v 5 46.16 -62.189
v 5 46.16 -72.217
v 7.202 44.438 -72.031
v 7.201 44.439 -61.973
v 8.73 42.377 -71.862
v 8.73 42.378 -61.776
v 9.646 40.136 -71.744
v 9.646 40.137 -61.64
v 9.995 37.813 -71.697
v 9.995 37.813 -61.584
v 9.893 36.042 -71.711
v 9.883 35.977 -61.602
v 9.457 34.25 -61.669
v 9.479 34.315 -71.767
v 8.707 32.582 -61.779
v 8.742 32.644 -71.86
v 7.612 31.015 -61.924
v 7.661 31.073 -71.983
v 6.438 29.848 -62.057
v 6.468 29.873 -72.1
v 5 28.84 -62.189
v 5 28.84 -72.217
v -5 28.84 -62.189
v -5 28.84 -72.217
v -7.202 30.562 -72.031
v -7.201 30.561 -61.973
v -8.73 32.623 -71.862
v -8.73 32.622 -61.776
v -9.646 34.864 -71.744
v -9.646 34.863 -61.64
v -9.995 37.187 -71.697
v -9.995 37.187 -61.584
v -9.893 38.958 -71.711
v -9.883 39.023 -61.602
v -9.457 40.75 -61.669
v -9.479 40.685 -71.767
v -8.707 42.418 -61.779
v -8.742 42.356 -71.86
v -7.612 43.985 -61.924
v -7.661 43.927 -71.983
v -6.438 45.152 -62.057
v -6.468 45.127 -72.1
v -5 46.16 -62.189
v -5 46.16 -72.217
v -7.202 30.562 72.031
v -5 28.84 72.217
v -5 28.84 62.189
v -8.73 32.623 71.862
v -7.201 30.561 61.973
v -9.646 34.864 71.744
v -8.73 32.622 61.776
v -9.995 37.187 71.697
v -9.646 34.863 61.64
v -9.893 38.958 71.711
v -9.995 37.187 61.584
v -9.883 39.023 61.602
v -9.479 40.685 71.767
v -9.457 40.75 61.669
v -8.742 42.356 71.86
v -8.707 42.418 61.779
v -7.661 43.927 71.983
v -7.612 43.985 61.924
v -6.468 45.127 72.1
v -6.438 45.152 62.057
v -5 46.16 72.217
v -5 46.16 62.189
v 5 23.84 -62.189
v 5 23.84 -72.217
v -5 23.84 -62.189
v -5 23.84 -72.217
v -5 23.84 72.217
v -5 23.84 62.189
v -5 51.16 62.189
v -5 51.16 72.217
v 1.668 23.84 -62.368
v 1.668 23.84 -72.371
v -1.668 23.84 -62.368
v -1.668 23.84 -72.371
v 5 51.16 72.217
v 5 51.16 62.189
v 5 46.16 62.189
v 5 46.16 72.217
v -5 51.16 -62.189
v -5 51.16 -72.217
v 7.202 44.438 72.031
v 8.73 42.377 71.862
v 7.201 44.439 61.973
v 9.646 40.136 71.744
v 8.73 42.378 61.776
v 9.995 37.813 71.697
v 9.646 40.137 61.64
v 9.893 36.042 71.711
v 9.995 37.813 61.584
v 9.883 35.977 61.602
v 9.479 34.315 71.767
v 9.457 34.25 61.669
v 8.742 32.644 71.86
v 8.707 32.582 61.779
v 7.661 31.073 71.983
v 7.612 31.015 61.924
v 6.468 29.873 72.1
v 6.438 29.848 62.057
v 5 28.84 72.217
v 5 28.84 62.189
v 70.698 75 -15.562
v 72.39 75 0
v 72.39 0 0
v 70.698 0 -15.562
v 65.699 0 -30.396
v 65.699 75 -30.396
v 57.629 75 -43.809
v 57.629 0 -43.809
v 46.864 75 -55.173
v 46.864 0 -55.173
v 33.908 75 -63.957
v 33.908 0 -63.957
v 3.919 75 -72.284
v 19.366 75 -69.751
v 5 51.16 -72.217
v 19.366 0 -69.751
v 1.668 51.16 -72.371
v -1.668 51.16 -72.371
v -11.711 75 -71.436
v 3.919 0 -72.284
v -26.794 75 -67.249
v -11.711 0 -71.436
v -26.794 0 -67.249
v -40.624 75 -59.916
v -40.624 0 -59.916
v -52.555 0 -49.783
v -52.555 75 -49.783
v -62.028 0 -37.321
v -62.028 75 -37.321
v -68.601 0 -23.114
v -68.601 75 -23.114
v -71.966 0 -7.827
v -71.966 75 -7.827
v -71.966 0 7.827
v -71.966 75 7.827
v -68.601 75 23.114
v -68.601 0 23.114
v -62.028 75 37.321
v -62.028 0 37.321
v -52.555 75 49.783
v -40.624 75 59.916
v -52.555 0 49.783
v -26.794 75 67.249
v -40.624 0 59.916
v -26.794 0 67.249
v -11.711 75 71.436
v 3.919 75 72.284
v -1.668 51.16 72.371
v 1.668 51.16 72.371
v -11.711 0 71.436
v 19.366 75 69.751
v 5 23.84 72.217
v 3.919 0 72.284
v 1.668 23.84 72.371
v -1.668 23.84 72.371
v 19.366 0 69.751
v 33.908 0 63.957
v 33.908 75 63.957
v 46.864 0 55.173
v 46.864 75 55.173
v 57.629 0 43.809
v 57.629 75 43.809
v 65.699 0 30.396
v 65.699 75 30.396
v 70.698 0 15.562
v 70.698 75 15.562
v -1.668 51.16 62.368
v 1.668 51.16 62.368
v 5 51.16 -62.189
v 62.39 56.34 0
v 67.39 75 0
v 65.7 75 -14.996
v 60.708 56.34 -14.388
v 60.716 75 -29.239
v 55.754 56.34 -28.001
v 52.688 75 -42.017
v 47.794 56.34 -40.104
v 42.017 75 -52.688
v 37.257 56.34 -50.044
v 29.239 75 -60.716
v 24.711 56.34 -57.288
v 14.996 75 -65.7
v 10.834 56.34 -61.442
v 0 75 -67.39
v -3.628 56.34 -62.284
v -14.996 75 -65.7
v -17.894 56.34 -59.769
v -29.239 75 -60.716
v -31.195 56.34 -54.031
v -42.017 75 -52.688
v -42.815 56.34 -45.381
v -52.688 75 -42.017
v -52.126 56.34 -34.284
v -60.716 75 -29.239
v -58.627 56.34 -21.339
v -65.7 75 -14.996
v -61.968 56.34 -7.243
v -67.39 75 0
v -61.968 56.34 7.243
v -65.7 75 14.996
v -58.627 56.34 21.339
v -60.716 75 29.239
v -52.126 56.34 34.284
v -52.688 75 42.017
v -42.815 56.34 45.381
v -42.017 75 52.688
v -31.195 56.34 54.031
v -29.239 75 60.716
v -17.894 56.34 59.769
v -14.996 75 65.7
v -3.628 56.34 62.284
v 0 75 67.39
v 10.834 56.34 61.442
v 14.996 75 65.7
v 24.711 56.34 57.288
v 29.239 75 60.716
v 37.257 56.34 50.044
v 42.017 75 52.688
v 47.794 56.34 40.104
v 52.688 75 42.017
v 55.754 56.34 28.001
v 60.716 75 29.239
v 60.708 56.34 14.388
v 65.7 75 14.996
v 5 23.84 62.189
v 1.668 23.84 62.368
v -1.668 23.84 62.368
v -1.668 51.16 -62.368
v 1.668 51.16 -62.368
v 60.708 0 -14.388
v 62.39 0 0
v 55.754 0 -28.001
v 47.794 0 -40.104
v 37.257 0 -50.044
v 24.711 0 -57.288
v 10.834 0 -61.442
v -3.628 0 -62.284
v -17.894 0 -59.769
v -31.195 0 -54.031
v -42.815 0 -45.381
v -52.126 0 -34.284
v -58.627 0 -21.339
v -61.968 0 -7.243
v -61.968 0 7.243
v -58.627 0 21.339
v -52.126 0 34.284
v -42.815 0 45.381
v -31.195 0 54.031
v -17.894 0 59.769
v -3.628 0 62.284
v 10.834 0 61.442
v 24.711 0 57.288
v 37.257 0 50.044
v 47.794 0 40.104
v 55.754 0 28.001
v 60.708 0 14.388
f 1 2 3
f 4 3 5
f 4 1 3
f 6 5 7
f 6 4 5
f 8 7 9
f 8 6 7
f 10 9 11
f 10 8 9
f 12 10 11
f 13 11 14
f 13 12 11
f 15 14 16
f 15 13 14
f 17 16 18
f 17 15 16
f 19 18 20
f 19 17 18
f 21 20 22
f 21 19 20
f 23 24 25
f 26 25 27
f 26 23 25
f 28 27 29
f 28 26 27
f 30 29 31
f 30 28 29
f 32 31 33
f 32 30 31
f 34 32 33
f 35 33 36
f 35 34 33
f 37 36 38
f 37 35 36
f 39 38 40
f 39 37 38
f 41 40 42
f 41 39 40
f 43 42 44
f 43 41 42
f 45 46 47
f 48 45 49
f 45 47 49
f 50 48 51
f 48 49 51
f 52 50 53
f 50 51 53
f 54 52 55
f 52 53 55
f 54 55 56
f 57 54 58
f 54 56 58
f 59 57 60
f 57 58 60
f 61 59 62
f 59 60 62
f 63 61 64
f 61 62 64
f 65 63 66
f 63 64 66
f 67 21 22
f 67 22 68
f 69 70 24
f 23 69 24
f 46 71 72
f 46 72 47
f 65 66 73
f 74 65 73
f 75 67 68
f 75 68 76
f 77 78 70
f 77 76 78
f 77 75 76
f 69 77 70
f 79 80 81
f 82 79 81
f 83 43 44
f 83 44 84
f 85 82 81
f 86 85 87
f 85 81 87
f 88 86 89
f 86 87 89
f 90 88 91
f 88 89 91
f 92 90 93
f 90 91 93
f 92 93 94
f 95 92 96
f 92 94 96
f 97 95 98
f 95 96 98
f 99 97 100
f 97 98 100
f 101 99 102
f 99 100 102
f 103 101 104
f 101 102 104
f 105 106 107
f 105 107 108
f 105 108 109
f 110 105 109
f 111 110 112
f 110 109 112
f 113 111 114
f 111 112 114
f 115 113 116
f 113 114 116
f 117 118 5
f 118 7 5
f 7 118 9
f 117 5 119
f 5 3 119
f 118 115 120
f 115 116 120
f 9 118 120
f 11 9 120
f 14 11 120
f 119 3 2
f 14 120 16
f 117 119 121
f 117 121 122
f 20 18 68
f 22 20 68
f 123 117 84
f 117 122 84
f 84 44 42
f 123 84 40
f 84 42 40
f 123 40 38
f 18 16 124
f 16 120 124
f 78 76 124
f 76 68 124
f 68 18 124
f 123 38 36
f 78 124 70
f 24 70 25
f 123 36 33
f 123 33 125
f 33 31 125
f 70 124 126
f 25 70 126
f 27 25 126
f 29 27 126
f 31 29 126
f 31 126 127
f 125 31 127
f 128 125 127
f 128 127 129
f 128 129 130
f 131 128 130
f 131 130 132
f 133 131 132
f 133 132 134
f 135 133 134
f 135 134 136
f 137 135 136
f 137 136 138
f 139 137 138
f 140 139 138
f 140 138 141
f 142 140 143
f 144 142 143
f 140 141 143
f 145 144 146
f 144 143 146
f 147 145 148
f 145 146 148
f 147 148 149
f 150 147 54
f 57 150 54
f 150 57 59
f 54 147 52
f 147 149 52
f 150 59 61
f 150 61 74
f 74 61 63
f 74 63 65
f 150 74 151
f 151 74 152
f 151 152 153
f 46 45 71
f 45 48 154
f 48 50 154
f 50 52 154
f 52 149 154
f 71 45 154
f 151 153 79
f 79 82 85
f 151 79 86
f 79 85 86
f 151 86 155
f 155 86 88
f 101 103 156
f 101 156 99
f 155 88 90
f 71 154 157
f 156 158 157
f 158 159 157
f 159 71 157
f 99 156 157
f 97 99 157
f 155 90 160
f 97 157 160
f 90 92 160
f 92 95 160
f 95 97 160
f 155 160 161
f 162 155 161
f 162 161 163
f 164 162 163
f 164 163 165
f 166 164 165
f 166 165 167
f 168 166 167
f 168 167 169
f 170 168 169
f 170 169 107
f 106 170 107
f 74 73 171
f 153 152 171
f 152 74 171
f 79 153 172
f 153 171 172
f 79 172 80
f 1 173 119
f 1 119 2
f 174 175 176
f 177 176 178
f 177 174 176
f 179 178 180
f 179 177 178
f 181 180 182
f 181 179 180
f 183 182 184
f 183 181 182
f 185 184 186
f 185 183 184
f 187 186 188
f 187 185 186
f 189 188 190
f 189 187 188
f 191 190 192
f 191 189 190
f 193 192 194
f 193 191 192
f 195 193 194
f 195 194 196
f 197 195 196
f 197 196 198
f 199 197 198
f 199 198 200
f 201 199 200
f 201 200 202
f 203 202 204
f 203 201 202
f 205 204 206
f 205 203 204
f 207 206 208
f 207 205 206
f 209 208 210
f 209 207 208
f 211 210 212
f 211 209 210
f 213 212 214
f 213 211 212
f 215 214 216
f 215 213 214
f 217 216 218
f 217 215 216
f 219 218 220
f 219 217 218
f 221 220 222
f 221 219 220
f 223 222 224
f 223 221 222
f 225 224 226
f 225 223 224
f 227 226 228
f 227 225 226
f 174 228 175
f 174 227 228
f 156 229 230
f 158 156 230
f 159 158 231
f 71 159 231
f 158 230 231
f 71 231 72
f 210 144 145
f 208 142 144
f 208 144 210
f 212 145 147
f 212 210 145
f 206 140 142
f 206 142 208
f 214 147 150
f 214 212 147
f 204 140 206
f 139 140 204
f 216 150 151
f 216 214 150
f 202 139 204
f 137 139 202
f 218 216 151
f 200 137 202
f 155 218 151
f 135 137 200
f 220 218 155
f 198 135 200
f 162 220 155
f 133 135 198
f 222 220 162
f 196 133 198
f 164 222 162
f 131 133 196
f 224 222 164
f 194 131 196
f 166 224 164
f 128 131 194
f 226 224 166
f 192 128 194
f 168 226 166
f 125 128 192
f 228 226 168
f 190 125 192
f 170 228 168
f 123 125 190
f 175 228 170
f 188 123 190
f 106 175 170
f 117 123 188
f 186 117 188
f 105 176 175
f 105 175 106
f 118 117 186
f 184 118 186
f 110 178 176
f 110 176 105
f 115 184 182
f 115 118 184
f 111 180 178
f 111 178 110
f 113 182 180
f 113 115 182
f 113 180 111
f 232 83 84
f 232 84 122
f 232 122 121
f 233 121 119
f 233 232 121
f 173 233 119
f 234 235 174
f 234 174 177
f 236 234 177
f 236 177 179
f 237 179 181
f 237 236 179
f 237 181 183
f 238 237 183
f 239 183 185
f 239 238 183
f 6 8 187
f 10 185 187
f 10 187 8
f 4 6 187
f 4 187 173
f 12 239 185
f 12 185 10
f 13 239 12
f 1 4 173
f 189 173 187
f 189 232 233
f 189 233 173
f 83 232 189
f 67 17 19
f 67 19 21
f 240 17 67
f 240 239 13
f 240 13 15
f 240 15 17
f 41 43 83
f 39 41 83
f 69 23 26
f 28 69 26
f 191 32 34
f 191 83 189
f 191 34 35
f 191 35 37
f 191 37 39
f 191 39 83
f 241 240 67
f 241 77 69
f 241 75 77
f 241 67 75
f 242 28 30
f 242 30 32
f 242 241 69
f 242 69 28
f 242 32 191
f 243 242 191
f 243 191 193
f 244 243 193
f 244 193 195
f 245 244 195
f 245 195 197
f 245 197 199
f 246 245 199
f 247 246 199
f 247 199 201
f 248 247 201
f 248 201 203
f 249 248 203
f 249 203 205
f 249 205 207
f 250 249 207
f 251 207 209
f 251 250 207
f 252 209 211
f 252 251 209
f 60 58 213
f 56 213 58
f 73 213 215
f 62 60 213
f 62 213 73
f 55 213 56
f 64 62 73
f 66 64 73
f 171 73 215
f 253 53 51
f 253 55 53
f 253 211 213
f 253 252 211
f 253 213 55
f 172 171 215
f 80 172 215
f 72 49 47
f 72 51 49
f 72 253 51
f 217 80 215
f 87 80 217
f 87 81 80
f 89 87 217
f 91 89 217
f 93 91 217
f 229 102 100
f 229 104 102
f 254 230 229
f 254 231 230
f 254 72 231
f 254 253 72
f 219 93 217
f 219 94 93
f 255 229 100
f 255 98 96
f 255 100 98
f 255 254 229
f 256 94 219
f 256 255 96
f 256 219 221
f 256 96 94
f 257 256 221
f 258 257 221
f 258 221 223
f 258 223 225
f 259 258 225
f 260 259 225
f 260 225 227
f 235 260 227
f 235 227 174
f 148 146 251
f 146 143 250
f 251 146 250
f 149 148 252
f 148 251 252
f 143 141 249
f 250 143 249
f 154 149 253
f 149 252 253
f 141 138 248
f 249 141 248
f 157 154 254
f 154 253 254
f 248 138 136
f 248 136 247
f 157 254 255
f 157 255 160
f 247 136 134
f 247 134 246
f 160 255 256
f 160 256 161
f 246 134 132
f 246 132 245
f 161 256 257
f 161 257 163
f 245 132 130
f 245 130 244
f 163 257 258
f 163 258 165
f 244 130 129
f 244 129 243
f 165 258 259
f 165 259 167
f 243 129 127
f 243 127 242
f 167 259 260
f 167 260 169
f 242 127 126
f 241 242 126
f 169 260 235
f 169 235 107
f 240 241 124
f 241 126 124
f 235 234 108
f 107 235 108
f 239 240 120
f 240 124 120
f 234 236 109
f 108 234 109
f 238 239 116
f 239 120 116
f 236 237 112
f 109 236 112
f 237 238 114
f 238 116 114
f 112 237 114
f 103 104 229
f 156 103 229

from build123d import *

# Parameters (mm, degrees)
SKETCH1_R               = 72.39
SKETCH1_R_2             = 62.39
BOSS_EXTRUDE1_DEPTH     = 75
CUT_EXTRUDE1_DEPTH      = 73.39
CUT_EXTRUDE1_DEPTH_BACK = 73.39
CHAMFER1_SIZE           = 5
CHAMFER1_SIZE2          = 18.660254038


with BuildPart() as part:
    # Sketch1 → Boss-Extrude1 (new body)
    with BuildSketch(Plane(origin=(0, 0, 0), x_dir=(1, 0, 0), z_dir=(0, 1, 0))):
        Circle(SKETCH1_R)
        Circle(SKETCH1_R_2, mode=Mode.SUBTRACT)
    extrude(amount=BOSS_EXTRUDE1_DEPTH)

    # Sketch2 → Cut-Extrude1 (cut, two sides)
    with BuildSketch(Plane.XY) as cut_extrude1_sk:
        with BuildLine():
            Line((5, 28.839745962), (5, 23.839745962))
            Line((5, 23.839745962), (-5, 23.839745962))
            Line((-5, 23.839745962), (-5, 28.839745962))
            ThreePointArc((-5, 28.839745962), (-10, 37.5), (-5, 46.160254038))
            Line((-5, 46.160254038), (-5, 51.160254038))
            Line((-5, 51.160254038), (5, 51.160254038))
            Line((5, 51.160254038), (5, 46.160254038))
            ThreePointArc((5, 46.160254038), (10, 37.5), (5, 28.839745962))
        make_face()
    extrude(amount=CUT_EXTRUDE1_DEPTH, mode=Mode.SUBTRACT)
    extrude(cut_extrude1_sk.sketch, amount=-CUT_EXTRUDE1_DEPTH_BACK, mode=Mode.SUBTRACT)

    # Chamfer1
    chamfer1_edges = [part.edges().sort_by_distance(p)[0] for p in [
        (-62.39, 75, 0),
    ]]
    chamfer1_side = [part.faces().sort_by_distance(p)[0] for p in [
        (-70.342501604, 75, 0),
    ]]
    chamfer(chamfer1_edges, length=CHAMFER1_SIZE, length2=CHAMFER1_SIZE2, reference=chamfer1_side[0])


solid = part.part
